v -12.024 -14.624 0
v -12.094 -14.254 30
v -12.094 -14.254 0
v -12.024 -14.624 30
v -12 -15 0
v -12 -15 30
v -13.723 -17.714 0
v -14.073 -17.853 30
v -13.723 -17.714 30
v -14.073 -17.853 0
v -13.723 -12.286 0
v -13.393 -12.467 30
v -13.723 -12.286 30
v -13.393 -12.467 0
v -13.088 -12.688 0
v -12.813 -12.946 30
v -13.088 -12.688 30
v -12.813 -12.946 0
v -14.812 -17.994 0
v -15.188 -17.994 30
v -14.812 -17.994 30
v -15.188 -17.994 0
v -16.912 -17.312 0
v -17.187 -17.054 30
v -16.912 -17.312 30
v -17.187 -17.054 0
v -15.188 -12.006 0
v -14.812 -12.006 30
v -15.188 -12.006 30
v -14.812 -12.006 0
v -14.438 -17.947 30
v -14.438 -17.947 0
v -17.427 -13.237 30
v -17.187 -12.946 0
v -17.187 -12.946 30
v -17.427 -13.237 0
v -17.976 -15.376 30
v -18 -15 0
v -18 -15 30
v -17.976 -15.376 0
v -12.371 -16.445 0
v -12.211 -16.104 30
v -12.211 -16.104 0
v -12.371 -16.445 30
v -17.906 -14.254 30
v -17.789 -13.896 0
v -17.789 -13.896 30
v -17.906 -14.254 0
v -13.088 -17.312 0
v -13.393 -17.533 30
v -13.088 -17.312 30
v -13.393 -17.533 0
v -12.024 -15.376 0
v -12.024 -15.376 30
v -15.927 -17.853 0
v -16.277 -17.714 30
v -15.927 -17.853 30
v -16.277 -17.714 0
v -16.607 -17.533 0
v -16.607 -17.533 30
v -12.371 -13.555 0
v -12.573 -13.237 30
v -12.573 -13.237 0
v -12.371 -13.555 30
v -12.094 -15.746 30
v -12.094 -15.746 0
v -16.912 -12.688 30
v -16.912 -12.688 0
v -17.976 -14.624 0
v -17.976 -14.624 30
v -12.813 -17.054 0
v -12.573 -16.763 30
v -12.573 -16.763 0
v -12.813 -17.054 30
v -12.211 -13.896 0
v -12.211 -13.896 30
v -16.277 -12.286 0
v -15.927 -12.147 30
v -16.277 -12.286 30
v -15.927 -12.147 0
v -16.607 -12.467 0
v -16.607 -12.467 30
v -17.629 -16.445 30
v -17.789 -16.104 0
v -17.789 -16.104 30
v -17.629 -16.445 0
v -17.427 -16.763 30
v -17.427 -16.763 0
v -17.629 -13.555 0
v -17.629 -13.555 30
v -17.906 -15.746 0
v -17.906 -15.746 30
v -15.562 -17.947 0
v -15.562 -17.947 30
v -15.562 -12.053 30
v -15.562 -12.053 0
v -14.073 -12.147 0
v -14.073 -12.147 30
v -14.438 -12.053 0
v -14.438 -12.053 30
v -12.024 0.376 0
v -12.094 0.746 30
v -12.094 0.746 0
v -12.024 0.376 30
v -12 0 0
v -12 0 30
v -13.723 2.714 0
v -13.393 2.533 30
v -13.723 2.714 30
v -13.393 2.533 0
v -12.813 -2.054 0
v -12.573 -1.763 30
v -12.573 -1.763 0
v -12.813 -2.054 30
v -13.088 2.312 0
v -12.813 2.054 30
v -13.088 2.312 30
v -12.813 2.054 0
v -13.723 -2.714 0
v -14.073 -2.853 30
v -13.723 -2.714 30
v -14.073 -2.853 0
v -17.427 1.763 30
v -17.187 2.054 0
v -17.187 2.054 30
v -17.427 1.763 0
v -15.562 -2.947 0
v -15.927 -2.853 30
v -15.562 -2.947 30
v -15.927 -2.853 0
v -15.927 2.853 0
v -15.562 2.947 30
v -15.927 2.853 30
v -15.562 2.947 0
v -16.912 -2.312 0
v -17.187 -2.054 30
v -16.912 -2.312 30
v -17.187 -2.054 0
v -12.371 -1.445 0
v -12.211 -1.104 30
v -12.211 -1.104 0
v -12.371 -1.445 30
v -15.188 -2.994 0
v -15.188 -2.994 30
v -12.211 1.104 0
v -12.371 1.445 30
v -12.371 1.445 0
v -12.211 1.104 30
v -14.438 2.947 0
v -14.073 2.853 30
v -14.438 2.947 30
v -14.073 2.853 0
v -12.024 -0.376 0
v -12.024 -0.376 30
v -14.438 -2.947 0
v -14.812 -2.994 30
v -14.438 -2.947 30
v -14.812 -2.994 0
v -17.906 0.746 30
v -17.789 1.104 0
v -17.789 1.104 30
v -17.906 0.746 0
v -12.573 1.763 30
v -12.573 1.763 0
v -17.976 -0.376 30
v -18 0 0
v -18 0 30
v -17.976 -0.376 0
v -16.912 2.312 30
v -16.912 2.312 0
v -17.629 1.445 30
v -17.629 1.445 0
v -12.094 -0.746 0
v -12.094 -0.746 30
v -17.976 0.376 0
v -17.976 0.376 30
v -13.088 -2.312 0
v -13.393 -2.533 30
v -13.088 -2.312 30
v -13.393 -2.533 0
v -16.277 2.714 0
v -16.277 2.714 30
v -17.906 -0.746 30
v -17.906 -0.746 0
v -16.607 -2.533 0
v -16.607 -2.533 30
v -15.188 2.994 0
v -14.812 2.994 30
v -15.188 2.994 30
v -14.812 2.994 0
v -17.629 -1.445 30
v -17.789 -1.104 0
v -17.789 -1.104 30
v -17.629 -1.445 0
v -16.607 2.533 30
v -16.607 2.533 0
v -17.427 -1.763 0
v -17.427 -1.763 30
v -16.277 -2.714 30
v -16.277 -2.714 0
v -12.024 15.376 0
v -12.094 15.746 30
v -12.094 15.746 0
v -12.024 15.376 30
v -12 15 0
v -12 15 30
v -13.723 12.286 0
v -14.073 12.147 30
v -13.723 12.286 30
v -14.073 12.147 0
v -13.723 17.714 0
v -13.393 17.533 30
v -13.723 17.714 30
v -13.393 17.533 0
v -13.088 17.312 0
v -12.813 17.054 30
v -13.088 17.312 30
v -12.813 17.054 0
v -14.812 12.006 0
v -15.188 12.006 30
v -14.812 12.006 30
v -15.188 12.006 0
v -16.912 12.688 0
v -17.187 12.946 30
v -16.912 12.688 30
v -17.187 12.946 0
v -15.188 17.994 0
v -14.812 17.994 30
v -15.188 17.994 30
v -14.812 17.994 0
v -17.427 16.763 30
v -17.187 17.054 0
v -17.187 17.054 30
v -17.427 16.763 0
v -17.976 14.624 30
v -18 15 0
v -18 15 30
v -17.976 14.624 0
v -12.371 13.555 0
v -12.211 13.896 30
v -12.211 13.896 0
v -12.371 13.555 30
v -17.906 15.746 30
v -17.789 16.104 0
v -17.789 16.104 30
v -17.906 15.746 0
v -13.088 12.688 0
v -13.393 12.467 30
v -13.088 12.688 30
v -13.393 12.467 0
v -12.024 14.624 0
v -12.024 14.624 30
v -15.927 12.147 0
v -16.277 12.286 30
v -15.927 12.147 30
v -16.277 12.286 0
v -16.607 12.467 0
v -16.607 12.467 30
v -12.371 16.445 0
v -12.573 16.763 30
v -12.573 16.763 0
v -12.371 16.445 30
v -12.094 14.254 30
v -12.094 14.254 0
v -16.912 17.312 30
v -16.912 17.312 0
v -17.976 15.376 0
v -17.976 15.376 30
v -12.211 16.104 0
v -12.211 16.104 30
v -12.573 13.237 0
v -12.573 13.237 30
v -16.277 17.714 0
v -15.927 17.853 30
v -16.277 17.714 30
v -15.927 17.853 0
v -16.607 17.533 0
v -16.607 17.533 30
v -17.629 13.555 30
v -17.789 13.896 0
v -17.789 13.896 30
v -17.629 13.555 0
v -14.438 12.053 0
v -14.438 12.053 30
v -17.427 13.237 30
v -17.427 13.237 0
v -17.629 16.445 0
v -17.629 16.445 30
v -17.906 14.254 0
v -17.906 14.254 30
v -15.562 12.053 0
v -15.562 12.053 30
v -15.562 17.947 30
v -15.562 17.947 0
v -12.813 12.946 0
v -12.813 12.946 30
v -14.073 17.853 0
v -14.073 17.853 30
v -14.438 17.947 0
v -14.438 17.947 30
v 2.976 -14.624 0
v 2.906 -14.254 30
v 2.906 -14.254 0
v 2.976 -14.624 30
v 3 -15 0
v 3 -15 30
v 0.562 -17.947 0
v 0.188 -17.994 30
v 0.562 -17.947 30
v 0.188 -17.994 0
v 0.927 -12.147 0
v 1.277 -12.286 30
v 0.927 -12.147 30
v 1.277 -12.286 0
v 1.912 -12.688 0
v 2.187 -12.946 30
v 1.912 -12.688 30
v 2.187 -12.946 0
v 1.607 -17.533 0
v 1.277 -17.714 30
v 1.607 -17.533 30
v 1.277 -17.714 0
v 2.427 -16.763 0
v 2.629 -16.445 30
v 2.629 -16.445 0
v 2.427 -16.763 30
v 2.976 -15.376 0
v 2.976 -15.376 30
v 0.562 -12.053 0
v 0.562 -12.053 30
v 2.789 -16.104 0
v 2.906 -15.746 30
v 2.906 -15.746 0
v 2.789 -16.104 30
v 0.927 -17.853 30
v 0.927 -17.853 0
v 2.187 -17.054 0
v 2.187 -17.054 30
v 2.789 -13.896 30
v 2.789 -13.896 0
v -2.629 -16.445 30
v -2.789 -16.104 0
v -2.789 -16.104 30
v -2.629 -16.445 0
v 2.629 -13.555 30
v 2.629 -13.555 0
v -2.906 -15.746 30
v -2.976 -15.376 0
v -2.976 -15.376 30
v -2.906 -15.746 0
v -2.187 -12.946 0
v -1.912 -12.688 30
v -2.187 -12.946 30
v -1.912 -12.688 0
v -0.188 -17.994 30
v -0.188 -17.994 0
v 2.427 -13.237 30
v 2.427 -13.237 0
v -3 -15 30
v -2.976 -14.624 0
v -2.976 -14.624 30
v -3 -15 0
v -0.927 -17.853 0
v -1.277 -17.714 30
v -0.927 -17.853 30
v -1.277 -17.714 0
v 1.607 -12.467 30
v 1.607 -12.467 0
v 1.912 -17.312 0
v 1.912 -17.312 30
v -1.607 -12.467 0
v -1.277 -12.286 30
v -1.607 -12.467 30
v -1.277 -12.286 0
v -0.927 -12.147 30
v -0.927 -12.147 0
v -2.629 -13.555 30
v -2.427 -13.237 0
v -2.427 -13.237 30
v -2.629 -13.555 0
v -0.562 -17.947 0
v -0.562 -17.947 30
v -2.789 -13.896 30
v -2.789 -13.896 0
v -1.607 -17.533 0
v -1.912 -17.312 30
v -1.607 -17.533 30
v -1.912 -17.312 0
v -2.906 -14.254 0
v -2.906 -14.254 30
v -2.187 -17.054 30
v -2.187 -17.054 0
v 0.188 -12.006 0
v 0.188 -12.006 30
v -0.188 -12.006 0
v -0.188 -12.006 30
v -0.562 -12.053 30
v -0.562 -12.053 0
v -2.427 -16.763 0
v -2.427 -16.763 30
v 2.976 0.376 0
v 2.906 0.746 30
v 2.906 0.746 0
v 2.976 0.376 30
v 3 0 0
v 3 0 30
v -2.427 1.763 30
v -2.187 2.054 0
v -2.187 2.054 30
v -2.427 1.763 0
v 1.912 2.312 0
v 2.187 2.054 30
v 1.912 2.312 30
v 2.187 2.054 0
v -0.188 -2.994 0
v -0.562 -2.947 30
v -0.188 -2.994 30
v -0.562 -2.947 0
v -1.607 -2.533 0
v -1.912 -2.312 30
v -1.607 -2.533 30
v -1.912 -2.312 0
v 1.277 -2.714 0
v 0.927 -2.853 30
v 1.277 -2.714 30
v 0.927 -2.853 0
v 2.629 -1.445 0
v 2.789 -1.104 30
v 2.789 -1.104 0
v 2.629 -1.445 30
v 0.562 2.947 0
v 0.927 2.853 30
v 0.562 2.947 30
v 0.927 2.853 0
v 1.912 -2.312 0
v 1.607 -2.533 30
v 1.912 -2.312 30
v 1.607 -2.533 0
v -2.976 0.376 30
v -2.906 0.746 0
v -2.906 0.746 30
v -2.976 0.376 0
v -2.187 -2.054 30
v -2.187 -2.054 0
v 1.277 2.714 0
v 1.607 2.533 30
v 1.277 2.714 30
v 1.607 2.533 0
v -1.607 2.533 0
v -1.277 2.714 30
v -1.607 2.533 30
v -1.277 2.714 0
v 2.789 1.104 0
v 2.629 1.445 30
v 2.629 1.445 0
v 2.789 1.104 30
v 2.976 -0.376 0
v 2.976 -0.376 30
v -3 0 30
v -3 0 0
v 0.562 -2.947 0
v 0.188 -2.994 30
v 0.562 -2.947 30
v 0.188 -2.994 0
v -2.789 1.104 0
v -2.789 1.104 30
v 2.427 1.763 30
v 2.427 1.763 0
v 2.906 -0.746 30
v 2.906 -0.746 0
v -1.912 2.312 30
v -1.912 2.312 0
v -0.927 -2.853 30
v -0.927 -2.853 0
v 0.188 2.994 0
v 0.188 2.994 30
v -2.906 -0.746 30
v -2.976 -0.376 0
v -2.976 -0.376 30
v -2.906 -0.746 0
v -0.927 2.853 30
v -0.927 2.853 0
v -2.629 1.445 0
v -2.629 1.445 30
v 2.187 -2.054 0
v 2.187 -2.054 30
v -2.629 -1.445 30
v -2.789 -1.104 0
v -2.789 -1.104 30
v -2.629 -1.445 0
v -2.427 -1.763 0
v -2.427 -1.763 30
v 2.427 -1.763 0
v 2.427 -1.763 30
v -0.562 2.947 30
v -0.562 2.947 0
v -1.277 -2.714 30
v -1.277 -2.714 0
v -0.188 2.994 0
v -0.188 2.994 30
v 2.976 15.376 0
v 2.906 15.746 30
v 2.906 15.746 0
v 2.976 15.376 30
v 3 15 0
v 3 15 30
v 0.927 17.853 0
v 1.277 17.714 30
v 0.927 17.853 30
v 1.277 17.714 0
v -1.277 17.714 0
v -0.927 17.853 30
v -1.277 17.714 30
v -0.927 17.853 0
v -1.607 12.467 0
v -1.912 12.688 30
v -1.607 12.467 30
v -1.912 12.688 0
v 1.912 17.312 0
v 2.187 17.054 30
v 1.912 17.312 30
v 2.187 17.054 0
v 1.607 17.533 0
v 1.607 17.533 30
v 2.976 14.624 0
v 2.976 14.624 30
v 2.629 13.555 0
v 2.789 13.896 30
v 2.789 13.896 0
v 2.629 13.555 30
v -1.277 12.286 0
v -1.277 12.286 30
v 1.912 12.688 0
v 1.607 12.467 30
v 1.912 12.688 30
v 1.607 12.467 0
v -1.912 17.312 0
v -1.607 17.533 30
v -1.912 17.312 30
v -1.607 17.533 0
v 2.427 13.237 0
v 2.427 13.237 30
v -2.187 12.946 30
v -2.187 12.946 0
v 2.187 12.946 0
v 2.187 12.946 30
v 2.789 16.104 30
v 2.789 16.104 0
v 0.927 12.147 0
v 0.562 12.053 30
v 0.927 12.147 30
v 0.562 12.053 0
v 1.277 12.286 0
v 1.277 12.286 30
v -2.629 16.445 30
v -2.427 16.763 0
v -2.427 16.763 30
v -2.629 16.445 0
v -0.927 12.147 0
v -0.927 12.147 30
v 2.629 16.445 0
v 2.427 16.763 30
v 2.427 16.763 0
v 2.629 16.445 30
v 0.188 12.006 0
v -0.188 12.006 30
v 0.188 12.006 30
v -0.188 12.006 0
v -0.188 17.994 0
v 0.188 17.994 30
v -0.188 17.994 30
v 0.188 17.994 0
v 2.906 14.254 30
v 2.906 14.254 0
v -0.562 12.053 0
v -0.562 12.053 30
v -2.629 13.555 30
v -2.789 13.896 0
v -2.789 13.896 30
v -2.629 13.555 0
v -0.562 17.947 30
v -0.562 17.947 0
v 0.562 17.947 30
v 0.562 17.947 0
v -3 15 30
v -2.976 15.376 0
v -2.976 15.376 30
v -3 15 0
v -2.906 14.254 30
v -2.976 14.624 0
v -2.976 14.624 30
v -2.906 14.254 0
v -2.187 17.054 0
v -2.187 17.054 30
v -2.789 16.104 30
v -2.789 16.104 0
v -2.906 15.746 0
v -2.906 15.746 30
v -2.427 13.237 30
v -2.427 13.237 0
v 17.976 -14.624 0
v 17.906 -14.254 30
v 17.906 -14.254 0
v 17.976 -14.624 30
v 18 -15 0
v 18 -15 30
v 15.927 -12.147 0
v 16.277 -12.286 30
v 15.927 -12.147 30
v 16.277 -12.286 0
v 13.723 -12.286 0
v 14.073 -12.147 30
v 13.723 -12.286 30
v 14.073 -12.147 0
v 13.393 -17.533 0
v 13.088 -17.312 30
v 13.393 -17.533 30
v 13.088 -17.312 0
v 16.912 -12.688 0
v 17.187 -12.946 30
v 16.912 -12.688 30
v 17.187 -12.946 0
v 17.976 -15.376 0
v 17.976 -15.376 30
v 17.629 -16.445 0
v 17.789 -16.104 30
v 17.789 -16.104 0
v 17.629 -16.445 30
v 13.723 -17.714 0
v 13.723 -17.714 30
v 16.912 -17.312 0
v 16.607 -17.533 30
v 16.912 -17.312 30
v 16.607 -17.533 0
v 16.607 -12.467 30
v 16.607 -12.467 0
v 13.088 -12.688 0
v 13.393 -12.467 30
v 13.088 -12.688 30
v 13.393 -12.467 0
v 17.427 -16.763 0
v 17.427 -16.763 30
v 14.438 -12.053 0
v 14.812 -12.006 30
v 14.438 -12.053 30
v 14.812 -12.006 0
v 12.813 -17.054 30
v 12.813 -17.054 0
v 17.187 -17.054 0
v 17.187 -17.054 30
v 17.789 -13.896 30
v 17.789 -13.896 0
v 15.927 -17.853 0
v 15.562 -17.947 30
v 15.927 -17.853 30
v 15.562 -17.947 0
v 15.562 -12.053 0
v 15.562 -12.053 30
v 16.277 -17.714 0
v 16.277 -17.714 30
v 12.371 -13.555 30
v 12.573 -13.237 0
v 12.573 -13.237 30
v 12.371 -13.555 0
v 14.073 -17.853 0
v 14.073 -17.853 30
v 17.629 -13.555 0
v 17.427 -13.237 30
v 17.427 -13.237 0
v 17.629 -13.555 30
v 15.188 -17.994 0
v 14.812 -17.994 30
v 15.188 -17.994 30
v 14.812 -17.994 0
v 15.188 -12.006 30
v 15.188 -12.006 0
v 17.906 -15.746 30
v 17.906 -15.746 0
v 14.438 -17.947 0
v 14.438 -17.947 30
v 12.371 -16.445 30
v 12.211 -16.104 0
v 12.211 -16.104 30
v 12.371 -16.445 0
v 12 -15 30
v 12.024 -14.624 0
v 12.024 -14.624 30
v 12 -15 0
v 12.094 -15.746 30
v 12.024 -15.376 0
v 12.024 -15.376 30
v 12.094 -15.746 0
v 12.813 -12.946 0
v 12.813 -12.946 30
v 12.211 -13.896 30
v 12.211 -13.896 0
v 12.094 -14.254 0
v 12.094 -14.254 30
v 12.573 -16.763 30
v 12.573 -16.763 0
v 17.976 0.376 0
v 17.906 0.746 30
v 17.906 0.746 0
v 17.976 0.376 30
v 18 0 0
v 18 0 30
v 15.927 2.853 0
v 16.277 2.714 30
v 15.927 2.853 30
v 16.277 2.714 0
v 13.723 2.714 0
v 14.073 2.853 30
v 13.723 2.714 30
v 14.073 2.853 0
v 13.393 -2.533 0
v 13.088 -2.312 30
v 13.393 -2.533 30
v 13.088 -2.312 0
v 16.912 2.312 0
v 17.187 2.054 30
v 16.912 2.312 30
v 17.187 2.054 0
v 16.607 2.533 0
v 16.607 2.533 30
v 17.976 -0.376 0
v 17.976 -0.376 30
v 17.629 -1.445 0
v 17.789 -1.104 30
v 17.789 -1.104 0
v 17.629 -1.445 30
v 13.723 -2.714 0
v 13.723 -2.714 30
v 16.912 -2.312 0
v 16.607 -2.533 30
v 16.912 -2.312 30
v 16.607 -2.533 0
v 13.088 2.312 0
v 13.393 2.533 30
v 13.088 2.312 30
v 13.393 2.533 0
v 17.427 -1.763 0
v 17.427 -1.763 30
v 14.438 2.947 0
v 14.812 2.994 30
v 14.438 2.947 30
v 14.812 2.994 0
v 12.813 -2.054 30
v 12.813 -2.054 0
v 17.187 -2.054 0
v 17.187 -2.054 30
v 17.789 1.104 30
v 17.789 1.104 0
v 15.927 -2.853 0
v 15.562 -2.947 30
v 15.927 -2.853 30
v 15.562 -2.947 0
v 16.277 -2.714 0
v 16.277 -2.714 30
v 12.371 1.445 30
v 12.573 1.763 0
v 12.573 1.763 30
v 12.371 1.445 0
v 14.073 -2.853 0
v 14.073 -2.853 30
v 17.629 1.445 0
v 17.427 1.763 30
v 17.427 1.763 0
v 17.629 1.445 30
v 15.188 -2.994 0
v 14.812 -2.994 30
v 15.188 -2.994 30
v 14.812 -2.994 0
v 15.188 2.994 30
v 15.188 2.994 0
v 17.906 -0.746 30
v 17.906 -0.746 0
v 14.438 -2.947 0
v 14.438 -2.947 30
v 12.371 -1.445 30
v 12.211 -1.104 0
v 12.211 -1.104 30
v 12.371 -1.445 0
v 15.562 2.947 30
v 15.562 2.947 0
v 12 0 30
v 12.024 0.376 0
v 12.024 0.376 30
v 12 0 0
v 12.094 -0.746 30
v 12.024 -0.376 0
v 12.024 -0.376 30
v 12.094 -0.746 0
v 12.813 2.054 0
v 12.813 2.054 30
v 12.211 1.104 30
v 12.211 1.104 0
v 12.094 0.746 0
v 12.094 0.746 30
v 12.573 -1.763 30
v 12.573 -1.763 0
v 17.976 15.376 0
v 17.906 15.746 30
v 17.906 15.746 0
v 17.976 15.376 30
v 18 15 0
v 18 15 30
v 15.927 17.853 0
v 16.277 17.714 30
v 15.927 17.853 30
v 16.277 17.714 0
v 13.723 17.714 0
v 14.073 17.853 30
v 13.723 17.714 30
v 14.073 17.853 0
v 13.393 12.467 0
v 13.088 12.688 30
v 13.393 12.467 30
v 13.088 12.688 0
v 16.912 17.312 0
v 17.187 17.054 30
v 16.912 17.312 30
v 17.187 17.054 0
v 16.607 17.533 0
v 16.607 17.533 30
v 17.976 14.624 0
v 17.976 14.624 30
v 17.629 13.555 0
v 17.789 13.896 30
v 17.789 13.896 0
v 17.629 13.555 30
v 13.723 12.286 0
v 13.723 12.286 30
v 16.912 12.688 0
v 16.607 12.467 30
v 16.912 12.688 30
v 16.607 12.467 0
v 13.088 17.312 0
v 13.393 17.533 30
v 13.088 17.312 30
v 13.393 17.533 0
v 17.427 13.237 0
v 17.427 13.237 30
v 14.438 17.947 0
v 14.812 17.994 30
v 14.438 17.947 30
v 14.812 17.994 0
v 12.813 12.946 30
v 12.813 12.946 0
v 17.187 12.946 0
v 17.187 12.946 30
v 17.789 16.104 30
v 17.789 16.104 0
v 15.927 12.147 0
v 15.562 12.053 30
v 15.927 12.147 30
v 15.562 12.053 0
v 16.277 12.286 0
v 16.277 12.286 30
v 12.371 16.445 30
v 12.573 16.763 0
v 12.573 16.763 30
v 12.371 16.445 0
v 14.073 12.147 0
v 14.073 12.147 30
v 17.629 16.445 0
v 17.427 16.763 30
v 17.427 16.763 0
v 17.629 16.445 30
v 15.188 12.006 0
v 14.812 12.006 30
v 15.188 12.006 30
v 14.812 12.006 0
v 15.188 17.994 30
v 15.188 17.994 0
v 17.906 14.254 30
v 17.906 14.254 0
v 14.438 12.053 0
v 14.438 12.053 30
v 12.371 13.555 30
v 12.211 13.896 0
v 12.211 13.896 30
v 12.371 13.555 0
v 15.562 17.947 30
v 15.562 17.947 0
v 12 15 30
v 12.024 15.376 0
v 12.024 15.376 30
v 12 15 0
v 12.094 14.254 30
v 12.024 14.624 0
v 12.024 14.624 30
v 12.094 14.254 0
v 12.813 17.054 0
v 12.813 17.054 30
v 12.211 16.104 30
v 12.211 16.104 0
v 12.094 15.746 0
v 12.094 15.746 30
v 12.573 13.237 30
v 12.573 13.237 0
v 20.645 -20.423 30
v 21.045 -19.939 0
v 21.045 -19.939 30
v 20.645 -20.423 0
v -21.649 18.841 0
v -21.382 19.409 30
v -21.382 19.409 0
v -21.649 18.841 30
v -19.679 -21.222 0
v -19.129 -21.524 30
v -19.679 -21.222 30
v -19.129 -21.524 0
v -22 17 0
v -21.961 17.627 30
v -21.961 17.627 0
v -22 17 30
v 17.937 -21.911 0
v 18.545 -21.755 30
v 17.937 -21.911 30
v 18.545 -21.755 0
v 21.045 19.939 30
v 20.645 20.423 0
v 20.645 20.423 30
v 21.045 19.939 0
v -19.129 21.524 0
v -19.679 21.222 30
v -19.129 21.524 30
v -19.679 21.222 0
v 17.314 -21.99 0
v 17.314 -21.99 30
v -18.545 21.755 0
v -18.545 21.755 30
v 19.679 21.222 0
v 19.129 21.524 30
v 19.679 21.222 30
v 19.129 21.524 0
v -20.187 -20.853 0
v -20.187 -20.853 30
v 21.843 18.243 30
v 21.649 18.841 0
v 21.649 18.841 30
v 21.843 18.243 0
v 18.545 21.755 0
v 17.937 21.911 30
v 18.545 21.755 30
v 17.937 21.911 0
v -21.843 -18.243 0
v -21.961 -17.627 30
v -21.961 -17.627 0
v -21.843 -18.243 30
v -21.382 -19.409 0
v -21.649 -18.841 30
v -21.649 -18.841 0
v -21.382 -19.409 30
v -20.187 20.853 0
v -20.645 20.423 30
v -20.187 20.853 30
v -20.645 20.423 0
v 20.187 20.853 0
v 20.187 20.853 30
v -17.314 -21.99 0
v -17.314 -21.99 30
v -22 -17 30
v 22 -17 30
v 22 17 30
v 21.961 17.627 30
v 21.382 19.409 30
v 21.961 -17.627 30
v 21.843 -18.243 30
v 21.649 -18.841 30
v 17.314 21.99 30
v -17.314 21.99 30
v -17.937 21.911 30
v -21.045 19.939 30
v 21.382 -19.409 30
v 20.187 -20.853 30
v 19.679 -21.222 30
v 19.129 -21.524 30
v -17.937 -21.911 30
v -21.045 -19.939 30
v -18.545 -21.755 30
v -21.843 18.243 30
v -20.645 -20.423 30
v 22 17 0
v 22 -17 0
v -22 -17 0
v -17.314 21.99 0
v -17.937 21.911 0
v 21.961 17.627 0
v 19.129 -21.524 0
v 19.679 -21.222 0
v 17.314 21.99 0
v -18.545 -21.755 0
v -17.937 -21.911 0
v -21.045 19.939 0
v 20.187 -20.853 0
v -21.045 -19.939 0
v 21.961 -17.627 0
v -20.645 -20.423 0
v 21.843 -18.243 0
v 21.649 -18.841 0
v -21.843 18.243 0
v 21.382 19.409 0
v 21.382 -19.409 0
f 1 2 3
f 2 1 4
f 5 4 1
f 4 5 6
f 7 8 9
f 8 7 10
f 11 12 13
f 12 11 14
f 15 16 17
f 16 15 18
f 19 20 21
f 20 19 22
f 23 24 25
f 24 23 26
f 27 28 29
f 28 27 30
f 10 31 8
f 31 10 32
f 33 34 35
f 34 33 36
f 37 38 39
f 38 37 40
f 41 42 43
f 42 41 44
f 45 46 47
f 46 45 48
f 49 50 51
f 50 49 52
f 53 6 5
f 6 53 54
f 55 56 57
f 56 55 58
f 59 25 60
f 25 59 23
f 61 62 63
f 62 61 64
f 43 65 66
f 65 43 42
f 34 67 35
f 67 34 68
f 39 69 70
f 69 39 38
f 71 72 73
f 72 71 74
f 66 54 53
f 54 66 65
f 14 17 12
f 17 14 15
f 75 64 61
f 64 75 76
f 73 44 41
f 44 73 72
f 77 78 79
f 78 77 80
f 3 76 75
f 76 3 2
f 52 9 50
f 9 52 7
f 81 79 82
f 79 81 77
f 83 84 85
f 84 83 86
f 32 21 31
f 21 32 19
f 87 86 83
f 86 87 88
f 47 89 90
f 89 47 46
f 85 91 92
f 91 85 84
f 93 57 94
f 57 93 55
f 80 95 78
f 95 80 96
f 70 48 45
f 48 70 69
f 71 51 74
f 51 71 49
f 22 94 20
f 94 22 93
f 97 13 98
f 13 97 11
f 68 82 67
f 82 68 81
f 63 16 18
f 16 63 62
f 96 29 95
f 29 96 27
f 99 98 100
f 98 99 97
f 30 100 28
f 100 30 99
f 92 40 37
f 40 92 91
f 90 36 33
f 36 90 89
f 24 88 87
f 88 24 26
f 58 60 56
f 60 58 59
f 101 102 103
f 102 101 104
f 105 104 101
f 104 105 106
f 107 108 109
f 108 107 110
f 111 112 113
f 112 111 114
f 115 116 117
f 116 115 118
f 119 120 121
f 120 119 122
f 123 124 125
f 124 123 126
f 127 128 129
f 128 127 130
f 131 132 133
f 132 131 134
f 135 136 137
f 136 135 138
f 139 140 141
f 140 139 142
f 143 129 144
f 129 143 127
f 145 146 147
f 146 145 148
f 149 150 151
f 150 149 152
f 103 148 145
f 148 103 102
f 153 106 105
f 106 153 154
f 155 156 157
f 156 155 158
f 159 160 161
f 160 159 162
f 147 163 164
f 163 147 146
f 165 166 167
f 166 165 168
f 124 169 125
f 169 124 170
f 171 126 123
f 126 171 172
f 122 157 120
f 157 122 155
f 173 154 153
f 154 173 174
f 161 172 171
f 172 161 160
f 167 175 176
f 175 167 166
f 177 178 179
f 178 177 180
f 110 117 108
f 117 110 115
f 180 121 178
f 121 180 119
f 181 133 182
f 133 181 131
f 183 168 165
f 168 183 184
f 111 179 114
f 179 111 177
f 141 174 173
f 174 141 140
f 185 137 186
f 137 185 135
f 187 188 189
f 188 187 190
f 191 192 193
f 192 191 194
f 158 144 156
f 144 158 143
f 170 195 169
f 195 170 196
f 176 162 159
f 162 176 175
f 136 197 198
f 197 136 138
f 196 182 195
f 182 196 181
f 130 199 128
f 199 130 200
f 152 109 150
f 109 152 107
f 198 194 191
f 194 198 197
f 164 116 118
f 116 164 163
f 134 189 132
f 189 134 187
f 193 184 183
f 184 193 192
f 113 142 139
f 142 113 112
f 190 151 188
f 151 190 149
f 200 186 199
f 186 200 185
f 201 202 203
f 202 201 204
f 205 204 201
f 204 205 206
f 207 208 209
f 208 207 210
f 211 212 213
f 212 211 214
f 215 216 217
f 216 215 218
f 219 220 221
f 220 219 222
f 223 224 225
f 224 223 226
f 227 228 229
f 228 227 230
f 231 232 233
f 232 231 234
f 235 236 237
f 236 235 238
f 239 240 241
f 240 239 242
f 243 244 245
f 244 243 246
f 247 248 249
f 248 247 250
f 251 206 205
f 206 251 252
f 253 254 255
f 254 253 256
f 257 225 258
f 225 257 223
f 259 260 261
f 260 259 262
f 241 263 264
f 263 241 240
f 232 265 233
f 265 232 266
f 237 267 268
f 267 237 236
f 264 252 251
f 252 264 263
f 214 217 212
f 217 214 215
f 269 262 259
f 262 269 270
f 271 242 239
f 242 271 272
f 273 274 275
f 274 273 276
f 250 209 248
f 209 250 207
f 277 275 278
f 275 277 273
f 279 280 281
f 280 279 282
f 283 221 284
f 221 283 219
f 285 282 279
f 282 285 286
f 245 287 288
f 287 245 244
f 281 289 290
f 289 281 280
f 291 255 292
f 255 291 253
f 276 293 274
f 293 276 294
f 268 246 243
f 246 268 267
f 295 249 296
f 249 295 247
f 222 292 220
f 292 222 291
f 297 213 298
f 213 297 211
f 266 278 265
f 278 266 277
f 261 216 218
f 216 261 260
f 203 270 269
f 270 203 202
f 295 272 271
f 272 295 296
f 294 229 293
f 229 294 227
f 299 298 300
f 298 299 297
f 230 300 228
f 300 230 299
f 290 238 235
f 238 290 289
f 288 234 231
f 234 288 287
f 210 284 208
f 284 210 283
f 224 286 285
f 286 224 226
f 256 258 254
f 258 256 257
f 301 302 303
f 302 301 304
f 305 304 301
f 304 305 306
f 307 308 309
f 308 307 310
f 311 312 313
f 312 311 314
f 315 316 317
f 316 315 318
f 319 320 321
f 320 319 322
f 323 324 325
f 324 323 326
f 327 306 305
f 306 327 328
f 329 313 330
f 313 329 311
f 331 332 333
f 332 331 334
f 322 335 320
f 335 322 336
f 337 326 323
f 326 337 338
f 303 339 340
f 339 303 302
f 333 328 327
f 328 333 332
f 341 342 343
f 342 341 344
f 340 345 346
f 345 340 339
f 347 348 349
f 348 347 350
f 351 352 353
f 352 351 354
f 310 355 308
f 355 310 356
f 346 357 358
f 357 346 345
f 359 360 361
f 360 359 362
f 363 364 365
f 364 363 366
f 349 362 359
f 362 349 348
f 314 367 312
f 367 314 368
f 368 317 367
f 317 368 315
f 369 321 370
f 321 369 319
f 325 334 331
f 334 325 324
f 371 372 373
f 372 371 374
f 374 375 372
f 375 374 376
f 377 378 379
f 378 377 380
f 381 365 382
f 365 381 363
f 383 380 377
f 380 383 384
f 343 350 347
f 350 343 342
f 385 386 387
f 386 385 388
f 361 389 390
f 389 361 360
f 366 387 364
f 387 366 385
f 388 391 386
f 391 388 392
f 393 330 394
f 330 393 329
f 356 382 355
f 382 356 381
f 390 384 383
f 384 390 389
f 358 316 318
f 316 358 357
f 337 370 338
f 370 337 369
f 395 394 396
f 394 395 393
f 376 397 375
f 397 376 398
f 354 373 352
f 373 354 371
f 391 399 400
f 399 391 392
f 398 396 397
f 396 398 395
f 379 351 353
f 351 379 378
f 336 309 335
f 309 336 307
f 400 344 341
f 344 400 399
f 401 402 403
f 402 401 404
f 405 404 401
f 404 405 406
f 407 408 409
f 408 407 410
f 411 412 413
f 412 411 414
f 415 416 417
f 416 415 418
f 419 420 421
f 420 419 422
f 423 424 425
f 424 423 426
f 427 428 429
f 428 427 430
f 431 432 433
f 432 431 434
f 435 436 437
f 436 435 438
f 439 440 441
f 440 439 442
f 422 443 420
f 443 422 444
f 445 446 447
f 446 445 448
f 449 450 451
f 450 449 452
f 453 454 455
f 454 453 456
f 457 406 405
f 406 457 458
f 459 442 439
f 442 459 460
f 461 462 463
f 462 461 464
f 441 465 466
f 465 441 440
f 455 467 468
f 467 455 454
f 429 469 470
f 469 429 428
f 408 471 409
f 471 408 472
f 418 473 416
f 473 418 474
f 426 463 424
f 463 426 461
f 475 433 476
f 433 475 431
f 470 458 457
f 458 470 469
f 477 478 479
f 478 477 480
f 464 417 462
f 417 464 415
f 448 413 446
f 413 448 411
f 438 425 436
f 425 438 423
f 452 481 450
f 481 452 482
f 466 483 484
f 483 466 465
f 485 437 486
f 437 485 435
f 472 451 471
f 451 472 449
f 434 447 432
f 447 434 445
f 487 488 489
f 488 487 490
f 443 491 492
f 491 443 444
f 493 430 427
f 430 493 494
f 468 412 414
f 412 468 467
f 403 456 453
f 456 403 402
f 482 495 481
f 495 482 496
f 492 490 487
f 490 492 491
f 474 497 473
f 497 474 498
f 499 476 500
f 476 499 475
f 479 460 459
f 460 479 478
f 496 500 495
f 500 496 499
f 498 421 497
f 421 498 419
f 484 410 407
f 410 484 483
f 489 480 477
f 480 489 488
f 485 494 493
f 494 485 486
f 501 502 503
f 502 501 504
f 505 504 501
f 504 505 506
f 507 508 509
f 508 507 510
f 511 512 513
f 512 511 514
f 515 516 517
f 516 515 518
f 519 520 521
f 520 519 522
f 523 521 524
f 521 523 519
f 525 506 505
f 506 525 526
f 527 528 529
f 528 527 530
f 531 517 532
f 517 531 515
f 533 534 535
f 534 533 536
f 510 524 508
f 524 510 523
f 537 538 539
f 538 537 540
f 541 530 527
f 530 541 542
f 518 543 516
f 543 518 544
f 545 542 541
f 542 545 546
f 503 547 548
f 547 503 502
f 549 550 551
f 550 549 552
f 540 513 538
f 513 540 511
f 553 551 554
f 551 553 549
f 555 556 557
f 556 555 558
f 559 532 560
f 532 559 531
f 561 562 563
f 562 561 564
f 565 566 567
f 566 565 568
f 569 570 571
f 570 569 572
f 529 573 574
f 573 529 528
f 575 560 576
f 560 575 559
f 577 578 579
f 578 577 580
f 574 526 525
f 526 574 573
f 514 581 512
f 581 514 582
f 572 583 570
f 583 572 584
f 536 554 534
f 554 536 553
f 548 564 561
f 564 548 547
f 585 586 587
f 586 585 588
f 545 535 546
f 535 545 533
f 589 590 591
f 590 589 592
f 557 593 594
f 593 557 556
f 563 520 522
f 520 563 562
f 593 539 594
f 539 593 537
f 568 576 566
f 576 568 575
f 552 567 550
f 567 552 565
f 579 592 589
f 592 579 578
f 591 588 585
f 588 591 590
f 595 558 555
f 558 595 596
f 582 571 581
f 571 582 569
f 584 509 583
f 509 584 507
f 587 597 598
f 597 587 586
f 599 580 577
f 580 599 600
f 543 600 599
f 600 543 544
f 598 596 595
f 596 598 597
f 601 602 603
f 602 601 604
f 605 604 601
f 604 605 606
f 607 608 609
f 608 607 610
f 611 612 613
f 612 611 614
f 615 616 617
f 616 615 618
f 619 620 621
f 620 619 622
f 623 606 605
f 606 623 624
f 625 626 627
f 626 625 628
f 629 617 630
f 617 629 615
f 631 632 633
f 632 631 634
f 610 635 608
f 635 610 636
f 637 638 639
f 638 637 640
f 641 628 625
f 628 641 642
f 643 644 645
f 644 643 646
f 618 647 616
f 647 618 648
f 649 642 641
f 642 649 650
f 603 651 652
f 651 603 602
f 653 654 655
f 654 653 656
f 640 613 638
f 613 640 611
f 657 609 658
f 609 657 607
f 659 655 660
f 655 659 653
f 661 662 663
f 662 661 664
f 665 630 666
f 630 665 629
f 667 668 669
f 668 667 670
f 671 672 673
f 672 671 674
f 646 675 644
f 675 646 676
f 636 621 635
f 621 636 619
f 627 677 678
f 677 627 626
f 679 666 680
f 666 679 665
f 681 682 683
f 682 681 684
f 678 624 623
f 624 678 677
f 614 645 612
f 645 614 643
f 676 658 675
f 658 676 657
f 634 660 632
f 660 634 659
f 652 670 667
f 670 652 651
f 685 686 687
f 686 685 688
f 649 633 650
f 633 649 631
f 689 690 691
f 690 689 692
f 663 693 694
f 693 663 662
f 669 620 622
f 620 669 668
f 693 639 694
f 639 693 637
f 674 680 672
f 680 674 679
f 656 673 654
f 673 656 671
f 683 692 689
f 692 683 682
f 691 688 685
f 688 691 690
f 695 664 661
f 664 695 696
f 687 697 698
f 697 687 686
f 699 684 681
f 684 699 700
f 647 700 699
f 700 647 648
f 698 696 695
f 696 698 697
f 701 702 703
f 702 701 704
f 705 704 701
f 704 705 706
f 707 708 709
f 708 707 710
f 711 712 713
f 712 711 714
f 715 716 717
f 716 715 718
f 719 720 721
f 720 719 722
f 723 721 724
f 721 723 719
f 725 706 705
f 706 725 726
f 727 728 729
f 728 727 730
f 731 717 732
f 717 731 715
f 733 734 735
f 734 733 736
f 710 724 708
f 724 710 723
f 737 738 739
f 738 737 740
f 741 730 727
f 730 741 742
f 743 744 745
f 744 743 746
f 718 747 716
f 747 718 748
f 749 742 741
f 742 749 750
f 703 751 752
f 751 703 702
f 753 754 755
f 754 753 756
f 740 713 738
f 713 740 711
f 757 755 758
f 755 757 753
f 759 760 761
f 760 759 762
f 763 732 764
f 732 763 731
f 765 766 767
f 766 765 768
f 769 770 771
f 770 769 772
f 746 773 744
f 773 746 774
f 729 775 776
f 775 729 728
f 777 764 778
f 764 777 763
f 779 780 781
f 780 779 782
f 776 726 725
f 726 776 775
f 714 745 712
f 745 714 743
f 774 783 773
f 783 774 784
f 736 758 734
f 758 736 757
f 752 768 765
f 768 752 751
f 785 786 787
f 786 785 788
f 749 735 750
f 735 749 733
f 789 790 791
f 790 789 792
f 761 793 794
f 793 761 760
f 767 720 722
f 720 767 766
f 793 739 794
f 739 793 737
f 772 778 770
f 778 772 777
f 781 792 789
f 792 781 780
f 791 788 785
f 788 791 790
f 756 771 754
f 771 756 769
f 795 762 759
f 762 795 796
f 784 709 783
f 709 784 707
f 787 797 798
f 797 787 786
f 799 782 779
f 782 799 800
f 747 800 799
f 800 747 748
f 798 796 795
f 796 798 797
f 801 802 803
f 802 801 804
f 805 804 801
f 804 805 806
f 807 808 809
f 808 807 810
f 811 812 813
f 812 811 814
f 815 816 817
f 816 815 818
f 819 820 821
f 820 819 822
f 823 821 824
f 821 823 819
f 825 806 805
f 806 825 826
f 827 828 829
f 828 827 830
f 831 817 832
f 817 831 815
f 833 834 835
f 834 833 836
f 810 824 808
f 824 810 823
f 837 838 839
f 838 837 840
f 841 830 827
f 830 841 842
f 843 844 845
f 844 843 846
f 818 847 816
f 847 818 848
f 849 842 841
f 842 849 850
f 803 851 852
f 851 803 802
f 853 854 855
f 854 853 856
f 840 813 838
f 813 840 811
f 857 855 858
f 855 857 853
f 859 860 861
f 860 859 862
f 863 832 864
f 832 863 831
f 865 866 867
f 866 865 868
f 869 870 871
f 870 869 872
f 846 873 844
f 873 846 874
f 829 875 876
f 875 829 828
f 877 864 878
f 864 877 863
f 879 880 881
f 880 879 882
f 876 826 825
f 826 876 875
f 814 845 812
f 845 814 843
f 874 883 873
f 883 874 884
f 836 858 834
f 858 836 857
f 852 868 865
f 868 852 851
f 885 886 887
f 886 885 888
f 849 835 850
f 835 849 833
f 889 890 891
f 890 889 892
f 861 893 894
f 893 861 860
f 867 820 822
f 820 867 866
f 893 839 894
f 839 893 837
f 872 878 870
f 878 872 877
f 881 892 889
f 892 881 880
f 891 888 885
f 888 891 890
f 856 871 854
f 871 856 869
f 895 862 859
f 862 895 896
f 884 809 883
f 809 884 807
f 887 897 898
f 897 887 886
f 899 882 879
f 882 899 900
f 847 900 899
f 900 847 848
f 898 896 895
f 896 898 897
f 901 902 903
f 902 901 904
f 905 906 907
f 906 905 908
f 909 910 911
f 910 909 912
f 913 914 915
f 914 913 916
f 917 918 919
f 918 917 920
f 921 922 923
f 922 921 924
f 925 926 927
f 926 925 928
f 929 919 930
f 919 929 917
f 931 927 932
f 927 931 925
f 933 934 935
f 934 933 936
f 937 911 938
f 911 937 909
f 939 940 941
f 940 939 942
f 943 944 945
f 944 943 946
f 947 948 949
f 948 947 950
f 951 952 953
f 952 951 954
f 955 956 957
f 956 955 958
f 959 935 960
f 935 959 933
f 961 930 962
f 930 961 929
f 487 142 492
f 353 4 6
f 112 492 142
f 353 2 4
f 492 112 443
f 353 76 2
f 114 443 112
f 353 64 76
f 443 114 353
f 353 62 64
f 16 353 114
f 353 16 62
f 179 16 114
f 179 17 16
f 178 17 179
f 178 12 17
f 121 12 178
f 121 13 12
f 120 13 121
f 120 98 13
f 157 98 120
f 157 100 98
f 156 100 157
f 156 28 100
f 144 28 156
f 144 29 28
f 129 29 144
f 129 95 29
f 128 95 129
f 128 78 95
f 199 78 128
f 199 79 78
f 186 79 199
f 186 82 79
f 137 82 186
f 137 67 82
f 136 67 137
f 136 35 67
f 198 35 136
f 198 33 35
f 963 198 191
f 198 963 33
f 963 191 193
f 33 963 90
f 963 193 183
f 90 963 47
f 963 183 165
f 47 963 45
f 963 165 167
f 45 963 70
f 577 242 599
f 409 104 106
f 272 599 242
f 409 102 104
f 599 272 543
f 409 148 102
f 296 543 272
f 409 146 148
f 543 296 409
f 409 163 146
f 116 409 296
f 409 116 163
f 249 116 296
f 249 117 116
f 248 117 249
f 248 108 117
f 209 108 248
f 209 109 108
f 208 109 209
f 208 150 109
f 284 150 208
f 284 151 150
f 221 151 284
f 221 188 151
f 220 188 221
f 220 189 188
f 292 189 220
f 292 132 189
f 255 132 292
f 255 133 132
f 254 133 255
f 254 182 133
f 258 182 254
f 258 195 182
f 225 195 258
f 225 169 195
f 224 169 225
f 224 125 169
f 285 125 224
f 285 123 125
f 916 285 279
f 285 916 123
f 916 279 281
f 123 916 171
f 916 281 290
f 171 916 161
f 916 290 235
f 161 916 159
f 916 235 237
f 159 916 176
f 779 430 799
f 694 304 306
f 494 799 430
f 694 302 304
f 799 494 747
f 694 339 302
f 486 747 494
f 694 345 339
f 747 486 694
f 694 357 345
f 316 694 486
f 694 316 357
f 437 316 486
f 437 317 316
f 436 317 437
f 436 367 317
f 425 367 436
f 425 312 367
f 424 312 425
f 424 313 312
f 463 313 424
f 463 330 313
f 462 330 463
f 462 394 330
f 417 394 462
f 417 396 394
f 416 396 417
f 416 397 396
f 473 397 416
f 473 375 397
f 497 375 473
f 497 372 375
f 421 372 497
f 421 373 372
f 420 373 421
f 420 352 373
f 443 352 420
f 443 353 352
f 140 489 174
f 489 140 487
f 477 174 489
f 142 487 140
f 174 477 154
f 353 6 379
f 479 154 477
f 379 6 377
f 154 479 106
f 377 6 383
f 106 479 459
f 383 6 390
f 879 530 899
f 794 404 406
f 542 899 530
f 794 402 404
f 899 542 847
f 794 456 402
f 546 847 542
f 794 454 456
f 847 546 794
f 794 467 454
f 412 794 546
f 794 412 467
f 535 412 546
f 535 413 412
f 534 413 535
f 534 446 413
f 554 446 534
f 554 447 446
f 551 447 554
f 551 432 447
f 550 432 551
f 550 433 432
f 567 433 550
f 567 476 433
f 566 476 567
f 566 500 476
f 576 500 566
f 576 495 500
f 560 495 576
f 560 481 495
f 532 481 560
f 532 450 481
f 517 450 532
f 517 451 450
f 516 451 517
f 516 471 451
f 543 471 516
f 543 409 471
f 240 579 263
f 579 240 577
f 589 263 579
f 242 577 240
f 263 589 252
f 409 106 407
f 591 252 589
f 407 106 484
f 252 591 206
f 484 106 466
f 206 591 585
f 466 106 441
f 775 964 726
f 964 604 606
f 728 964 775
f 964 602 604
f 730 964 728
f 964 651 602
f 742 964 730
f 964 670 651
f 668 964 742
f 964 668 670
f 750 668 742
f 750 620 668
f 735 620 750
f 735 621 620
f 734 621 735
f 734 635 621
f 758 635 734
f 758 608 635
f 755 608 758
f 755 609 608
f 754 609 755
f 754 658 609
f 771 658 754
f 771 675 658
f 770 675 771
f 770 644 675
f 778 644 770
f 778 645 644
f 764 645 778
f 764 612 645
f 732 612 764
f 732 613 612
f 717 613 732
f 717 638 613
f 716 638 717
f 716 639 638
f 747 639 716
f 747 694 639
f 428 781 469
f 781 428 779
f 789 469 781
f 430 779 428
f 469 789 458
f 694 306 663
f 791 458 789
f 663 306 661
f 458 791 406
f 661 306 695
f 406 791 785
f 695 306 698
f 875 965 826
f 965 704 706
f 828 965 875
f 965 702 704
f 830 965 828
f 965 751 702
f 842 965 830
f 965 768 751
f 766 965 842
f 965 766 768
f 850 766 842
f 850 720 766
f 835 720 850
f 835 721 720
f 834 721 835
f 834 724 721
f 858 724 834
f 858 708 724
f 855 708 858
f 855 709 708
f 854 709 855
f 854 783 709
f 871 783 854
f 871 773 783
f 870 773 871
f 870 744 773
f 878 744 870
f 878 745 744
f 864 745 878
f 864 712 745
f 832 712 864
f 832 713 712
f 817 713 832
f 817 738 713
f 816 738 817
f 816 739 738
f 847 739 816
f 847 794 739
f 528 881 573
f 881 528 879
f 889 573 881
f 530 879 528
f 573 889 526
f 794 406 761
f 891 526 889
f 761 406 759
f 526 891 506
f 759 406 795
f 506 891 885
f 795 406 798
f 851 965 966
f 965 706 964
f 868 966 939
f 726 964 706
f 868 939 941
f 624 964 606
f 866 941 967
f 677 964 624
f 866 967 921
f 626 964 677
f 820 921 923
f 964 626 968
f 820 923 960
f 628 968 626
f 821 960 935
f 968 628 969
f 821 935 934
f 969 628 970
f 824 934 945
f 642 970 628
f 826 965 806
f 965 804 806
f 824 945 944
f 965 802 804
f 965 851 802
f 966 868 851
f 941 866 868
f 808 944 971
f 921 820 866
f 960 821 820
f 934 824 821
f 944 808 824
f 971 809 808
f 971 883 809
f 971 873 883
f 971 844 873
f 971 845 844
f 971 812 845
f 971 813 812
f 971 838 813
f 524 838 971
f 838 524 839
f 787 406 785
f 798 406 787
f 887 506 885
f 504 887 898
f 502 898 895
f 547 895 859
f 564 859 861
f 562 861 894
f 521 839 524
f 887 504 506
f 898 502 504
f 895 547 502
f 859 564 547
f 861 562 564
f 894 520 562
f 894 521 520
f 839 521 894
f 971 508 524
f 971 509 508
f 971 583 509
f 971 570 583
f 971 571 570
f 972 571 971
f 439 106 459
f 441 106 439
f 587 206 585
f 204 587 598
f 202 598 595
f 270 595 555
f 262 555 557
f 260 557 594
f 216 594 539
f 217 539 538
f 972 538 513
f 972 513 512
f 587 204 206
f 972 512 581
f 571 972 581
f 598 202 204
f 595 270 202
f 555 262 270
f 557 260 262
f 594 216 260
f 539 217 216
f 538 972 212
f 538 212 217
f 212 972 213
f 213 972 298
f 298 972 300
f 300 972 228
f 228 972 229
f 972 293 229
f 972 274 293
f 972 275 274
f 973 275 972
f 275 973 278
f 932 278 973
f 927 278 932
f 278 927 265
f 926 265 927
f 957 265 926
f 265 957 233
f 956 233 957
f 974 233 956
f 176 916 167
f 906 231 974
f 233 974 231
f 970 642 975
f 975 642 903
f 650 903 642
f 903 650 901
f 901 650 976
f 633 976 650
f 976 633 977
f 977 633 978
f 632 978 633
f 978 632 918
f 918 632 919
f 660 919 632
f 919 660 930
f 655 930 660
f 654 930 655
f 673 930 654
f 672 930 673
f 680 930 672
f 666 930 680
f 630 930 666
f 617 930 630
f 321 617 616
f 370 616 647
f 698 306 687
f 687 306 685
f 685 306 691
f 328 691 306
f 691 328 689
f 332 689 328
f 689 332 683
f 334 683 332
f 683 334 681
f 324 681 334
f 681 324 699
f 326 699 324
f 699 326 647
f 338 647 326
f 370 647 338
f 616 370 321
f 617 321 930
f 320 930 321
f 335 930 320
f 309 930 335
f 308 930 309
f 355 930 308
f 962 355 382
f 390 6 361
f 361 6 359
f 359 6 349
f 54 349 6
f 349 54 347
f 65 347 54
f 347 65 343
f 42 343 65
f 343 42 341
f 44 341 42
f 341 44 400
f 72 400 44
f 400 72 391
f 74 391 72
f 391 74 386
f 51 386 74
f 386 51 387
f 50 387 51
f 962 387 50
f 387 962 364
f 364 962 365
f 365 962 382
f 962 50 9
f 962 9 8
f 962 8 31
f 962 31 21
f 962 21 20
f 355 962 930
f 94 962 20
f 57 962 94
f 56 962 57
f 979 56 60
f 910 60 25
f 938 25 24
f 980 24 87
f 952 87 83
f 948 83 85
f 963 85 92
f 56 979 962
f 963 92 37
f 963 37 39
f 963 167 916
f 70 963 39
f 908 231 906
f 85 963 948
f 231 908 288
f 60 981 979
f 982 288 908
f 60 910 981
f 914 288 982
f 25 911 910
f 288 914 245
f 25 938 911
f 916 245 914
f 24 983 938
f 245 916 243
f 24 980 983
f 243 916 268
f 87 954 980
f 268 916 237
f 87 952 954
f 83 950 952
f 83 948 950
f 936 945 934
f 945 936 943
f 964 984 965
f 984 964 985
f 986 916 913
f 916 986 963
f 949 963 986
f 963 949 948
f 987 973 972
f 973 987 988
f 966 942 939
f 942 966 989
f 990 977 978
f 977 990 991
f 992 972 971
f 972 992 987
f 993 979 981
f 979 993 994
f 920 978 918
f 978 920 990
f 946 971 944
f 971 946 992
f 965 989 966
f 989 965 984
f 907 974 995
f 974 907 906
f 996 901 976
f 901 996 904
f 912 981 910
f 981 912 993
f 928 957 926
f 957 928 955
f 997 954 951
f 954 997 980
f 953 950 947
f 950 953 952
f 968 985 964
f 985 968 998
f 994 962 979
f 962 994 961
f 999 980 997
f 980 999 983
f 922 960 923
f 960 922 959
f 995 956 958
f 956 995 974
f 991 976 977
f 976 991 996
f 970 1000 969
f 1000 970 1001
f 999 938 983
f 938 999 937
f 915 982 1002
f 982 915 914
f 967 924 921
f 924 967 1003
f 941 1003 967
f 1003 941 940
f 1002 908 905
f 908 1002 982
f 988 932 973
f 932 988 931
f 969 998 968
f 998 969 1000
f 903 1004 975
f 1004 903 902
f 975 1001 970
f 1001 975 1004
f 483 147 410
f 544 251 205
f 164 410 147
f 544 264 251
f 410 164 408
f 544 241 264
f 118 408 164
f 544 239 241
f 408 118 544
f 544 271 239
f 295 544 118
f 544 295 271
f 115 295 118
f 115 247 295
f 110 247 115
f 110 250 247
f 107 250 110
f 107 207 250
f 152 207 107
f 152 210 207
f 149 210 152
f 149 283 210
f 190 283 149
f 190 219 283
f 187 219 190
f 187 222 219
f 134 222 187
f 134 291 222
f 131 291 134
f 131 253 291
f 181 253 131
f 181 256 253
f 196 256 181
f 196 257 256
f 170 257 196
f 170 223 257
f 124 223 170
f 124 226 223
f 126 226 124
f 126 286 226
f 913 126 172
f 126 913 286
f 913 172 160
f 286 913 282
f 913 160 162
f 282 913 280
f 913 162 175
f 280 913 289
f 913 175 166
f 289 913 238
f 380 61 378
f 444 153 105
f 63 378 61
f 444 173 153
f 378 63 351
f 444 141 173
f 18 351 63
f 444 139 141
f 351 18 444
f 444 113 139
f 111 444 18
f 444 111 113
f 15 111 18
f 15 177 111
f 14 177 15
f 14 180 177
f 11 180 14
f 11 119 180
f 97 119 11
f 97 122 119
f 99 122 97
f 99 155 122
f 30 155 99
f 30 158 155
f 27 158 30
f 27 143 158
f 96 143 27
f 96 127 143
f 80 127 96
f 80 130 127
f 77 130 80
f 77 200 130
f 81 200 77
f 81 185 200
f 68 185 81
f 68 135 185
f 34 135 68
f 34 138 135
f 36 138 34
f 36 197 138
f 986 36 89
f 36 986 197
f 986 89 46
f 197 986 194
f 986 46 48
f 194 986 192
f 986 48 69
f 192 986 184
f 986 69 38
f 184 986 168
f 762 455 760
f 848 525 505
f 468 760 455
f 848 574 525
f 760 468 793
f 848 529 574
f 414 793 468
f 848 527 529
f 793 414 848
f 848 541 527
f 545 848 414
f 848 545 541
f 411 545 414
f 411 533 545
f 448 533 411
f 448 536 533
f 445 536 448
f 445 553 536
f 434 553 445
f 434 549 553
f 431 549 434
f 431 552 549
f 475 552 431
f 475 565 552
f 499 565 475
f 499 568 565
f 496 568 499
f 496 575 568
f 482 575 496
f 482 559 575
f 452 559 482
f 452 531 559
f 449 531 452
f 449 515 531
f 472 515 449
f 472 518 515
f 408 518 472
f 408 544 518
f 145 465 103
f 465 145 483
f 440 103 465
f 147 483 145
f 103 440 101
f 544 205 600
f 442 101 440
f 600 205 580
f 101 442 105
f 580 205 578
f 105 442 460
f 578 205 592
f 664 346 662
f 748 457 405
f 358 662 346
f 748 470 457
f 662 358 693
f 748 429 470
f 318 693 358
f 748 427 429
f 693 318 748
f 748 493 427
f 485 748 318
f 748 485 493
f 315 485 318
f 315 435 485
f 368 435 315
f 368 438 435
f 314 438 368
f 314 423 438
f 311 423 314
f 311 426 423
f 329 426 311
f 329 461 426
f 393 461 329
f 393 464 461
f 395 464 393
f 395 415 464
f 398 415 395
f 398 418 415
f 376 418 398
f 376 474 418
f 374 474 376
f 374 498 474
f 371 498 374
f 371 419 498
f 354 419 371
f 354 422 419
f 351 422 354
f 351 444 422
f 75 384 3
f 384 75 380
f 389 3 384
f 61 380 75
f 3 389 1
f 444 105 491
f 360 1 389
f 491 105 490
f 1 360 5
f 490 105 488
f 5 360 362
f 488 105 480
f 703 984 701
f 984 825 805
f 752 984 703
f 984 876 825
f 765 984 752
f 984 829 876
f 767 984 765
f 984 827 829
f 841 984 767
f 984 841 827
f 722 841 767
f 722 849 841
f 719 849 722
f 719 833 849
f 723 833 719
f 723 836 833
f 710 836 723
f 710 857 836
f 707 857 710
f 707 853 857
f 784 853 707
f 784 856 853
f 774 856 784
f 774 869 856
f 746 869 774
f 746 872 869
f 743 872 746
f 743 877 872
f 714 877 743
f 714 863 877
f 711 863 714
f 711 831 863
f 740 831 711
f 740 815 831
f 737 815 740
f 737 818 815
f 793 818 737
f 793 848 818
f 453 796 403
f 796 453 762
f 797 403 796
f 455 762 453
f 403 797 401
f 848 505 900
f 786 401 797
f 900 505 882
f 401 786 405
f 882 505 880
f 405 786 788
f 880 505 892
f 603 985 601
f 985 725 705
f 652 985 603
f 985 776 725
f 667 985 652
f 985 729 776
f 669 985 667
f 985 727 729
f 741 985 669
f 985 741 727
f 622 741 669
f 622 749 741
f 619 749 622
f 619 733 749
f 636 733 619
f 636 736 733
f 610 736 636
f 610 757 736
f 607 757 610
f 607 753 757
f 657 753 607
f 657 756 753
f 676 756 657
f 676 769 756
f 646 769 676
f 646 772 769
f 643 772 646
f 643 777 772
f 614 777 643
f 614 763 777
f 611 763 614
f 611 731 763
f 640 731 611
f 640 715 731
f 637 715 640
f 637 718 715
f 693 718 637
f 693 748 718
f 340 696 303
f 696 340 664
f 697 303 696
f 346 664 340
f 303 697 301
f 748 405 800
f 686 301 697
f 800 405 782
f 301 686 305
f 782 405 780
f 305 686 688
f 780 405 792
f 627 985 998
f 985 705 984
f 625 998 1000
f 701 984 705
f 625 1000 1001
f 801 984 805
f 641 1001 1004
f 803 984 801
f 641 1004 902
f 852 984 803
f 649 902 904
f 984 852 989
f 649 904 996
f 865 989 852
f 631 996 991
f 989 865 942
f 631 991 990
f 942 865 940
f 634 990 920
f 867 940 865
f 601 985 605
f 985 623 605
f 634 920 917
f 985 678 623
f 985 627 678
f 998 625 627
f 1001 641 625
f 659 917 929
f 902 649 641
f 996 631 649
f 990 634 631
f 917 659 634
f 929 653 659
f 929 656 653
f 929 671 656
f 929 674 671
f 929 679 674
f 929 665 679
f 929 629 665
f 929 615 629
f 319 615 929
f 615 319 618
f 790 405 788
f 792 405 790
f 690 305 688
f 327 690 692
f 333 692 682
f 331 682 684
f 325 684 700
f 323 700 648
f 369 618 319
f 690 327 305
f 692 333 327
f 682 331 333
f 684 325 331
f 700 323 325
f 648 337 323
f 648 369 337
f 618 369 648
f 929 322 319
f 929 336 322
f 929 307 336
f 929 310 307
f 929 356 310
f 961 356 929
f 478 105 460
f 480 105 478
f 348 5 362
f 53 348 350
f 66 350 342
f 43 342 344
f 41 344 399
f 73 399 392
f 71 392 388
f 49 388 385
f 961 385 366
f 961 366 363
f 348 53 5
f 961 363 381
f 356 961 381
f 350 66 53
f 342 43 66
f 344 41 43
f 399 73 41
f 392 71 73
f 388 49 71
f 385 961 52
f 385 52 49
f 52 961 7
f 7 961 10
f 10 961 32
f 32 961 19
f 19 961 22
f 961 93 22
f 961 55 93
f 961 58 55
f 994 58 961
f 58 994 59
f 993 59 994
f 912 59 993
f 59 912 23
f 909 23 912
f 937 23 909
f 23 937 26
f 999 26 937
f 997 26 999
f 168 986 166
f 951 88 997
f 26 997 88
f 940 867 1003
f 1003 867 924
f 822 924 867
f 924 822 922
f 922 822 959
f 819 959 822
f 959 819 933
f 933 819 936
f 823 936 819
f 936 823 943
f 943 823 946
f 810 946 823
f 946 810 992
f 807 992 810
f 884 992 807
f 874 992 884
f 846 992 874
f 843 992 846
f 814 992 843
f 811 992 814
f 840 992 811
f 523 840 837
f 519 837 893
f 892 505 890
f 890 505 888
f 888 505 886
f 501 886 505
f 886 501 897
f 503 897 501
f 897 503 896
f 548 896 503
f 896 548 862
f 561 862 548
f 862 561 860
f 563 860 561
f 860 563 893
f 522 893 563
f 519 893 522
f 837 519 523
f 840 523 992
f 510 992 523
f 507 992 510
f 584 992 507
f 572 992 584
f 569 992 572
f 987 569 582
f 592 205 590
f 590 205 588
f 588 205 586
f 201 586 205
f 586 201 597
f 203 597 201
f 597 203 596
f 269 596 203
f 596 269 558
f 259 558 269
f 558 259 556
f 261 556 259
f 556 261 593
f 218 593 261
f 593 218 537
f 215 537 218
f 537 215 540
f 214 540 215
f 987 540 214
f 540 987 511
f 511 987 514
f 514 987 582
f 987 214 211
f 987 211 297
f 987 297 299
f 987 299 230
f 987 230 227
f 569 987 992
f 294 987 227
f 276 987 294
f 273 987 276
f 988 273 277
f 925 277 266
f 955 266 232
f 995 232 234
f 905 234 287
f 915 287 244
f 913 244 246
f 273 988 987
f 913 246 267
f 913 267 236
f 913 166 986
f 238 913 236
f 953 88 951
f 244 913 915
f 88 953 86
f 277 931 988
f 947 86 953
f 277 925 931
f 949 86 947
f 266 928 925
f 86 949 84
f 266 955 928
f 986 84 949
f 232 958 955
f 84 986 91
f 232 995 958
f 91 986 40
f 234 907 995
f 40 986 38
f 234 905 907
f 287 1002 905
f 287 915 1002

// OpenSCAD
$fn = 50;


difference() {
	union() {
		hull() {
			translate(v = [-17.0000000000, 17.0000000000, 0]) {
				cylinder(h = 30, r = 5);
			}
			translate(v = [17.0000000000, 17.0000000000, 0]) {
				cylinder(h = 30, r = 5);
			}
			translate(v = [-17.0000000000, -17.0000000000, 0]) {
				cylinder(h = 30, r = 5);
			}
			translate(v = [17.0000000000, -17.0000000000, 0]) {
				cylinder(h = 30, r = 5);
			}
		}
	}
	union() {
		translate(v = [-15.0000000000, -15.0000000000, 0]) {
			translate(v = [0, 0, -100]) {
				cylinder(h = 200, r = 3.0000000000);
			}
		}
		translate(v = [-15.0000000000, 0.0000000000, 0]) {
			translate(v = [0, 0, -100]) {
				cylinder(h = 200, r = 3.0000000000);
			}
		}
		translate(v = [-15.0000000000, 15.0000000000, 0]) {
			translate(v = [0, 0, -100]) {
				cylinder(h = 200, r = 3.0000000000);
			}
		}
		translate(v = [0.0000000000, -15.0000000000, 0]) {
			translate(v = [0, 0, -100]) {
				cylinder(h = 200, r = 3.0000000000);
			}
		}
		translate(v = [0, 0, -100]) {
			cylinder(h = 200, r = 3.0000000000);
		}
		translate(v = [0.0000000000, 15.0000000000, 0]) {
			translate(v = [0, 0, -100]) {
				cylinder(h = 200, r = 3.0000000000);
			}
		}
		translate(v = [15.0000000000, -15.0000000000, 0]) {
			translate(v = [0, 0, -100]) {
				cylinder(h = 200, r = 3.0000000000);
			}
		}
		translate(v = [15.0000000000, 0.0000000000, 0]) {
			translate(v = [0, 0, -100]) {
				cylinder(h = 200, r = 3.0000000000);
			}
		}
		translate(v = [15.0000000000, 15.0000000000, 0]) {
			translate(v = [0, 0, -100]) {
				cylinder(h = 200, r = 3.0000000000);
			}
		}
	}
}
